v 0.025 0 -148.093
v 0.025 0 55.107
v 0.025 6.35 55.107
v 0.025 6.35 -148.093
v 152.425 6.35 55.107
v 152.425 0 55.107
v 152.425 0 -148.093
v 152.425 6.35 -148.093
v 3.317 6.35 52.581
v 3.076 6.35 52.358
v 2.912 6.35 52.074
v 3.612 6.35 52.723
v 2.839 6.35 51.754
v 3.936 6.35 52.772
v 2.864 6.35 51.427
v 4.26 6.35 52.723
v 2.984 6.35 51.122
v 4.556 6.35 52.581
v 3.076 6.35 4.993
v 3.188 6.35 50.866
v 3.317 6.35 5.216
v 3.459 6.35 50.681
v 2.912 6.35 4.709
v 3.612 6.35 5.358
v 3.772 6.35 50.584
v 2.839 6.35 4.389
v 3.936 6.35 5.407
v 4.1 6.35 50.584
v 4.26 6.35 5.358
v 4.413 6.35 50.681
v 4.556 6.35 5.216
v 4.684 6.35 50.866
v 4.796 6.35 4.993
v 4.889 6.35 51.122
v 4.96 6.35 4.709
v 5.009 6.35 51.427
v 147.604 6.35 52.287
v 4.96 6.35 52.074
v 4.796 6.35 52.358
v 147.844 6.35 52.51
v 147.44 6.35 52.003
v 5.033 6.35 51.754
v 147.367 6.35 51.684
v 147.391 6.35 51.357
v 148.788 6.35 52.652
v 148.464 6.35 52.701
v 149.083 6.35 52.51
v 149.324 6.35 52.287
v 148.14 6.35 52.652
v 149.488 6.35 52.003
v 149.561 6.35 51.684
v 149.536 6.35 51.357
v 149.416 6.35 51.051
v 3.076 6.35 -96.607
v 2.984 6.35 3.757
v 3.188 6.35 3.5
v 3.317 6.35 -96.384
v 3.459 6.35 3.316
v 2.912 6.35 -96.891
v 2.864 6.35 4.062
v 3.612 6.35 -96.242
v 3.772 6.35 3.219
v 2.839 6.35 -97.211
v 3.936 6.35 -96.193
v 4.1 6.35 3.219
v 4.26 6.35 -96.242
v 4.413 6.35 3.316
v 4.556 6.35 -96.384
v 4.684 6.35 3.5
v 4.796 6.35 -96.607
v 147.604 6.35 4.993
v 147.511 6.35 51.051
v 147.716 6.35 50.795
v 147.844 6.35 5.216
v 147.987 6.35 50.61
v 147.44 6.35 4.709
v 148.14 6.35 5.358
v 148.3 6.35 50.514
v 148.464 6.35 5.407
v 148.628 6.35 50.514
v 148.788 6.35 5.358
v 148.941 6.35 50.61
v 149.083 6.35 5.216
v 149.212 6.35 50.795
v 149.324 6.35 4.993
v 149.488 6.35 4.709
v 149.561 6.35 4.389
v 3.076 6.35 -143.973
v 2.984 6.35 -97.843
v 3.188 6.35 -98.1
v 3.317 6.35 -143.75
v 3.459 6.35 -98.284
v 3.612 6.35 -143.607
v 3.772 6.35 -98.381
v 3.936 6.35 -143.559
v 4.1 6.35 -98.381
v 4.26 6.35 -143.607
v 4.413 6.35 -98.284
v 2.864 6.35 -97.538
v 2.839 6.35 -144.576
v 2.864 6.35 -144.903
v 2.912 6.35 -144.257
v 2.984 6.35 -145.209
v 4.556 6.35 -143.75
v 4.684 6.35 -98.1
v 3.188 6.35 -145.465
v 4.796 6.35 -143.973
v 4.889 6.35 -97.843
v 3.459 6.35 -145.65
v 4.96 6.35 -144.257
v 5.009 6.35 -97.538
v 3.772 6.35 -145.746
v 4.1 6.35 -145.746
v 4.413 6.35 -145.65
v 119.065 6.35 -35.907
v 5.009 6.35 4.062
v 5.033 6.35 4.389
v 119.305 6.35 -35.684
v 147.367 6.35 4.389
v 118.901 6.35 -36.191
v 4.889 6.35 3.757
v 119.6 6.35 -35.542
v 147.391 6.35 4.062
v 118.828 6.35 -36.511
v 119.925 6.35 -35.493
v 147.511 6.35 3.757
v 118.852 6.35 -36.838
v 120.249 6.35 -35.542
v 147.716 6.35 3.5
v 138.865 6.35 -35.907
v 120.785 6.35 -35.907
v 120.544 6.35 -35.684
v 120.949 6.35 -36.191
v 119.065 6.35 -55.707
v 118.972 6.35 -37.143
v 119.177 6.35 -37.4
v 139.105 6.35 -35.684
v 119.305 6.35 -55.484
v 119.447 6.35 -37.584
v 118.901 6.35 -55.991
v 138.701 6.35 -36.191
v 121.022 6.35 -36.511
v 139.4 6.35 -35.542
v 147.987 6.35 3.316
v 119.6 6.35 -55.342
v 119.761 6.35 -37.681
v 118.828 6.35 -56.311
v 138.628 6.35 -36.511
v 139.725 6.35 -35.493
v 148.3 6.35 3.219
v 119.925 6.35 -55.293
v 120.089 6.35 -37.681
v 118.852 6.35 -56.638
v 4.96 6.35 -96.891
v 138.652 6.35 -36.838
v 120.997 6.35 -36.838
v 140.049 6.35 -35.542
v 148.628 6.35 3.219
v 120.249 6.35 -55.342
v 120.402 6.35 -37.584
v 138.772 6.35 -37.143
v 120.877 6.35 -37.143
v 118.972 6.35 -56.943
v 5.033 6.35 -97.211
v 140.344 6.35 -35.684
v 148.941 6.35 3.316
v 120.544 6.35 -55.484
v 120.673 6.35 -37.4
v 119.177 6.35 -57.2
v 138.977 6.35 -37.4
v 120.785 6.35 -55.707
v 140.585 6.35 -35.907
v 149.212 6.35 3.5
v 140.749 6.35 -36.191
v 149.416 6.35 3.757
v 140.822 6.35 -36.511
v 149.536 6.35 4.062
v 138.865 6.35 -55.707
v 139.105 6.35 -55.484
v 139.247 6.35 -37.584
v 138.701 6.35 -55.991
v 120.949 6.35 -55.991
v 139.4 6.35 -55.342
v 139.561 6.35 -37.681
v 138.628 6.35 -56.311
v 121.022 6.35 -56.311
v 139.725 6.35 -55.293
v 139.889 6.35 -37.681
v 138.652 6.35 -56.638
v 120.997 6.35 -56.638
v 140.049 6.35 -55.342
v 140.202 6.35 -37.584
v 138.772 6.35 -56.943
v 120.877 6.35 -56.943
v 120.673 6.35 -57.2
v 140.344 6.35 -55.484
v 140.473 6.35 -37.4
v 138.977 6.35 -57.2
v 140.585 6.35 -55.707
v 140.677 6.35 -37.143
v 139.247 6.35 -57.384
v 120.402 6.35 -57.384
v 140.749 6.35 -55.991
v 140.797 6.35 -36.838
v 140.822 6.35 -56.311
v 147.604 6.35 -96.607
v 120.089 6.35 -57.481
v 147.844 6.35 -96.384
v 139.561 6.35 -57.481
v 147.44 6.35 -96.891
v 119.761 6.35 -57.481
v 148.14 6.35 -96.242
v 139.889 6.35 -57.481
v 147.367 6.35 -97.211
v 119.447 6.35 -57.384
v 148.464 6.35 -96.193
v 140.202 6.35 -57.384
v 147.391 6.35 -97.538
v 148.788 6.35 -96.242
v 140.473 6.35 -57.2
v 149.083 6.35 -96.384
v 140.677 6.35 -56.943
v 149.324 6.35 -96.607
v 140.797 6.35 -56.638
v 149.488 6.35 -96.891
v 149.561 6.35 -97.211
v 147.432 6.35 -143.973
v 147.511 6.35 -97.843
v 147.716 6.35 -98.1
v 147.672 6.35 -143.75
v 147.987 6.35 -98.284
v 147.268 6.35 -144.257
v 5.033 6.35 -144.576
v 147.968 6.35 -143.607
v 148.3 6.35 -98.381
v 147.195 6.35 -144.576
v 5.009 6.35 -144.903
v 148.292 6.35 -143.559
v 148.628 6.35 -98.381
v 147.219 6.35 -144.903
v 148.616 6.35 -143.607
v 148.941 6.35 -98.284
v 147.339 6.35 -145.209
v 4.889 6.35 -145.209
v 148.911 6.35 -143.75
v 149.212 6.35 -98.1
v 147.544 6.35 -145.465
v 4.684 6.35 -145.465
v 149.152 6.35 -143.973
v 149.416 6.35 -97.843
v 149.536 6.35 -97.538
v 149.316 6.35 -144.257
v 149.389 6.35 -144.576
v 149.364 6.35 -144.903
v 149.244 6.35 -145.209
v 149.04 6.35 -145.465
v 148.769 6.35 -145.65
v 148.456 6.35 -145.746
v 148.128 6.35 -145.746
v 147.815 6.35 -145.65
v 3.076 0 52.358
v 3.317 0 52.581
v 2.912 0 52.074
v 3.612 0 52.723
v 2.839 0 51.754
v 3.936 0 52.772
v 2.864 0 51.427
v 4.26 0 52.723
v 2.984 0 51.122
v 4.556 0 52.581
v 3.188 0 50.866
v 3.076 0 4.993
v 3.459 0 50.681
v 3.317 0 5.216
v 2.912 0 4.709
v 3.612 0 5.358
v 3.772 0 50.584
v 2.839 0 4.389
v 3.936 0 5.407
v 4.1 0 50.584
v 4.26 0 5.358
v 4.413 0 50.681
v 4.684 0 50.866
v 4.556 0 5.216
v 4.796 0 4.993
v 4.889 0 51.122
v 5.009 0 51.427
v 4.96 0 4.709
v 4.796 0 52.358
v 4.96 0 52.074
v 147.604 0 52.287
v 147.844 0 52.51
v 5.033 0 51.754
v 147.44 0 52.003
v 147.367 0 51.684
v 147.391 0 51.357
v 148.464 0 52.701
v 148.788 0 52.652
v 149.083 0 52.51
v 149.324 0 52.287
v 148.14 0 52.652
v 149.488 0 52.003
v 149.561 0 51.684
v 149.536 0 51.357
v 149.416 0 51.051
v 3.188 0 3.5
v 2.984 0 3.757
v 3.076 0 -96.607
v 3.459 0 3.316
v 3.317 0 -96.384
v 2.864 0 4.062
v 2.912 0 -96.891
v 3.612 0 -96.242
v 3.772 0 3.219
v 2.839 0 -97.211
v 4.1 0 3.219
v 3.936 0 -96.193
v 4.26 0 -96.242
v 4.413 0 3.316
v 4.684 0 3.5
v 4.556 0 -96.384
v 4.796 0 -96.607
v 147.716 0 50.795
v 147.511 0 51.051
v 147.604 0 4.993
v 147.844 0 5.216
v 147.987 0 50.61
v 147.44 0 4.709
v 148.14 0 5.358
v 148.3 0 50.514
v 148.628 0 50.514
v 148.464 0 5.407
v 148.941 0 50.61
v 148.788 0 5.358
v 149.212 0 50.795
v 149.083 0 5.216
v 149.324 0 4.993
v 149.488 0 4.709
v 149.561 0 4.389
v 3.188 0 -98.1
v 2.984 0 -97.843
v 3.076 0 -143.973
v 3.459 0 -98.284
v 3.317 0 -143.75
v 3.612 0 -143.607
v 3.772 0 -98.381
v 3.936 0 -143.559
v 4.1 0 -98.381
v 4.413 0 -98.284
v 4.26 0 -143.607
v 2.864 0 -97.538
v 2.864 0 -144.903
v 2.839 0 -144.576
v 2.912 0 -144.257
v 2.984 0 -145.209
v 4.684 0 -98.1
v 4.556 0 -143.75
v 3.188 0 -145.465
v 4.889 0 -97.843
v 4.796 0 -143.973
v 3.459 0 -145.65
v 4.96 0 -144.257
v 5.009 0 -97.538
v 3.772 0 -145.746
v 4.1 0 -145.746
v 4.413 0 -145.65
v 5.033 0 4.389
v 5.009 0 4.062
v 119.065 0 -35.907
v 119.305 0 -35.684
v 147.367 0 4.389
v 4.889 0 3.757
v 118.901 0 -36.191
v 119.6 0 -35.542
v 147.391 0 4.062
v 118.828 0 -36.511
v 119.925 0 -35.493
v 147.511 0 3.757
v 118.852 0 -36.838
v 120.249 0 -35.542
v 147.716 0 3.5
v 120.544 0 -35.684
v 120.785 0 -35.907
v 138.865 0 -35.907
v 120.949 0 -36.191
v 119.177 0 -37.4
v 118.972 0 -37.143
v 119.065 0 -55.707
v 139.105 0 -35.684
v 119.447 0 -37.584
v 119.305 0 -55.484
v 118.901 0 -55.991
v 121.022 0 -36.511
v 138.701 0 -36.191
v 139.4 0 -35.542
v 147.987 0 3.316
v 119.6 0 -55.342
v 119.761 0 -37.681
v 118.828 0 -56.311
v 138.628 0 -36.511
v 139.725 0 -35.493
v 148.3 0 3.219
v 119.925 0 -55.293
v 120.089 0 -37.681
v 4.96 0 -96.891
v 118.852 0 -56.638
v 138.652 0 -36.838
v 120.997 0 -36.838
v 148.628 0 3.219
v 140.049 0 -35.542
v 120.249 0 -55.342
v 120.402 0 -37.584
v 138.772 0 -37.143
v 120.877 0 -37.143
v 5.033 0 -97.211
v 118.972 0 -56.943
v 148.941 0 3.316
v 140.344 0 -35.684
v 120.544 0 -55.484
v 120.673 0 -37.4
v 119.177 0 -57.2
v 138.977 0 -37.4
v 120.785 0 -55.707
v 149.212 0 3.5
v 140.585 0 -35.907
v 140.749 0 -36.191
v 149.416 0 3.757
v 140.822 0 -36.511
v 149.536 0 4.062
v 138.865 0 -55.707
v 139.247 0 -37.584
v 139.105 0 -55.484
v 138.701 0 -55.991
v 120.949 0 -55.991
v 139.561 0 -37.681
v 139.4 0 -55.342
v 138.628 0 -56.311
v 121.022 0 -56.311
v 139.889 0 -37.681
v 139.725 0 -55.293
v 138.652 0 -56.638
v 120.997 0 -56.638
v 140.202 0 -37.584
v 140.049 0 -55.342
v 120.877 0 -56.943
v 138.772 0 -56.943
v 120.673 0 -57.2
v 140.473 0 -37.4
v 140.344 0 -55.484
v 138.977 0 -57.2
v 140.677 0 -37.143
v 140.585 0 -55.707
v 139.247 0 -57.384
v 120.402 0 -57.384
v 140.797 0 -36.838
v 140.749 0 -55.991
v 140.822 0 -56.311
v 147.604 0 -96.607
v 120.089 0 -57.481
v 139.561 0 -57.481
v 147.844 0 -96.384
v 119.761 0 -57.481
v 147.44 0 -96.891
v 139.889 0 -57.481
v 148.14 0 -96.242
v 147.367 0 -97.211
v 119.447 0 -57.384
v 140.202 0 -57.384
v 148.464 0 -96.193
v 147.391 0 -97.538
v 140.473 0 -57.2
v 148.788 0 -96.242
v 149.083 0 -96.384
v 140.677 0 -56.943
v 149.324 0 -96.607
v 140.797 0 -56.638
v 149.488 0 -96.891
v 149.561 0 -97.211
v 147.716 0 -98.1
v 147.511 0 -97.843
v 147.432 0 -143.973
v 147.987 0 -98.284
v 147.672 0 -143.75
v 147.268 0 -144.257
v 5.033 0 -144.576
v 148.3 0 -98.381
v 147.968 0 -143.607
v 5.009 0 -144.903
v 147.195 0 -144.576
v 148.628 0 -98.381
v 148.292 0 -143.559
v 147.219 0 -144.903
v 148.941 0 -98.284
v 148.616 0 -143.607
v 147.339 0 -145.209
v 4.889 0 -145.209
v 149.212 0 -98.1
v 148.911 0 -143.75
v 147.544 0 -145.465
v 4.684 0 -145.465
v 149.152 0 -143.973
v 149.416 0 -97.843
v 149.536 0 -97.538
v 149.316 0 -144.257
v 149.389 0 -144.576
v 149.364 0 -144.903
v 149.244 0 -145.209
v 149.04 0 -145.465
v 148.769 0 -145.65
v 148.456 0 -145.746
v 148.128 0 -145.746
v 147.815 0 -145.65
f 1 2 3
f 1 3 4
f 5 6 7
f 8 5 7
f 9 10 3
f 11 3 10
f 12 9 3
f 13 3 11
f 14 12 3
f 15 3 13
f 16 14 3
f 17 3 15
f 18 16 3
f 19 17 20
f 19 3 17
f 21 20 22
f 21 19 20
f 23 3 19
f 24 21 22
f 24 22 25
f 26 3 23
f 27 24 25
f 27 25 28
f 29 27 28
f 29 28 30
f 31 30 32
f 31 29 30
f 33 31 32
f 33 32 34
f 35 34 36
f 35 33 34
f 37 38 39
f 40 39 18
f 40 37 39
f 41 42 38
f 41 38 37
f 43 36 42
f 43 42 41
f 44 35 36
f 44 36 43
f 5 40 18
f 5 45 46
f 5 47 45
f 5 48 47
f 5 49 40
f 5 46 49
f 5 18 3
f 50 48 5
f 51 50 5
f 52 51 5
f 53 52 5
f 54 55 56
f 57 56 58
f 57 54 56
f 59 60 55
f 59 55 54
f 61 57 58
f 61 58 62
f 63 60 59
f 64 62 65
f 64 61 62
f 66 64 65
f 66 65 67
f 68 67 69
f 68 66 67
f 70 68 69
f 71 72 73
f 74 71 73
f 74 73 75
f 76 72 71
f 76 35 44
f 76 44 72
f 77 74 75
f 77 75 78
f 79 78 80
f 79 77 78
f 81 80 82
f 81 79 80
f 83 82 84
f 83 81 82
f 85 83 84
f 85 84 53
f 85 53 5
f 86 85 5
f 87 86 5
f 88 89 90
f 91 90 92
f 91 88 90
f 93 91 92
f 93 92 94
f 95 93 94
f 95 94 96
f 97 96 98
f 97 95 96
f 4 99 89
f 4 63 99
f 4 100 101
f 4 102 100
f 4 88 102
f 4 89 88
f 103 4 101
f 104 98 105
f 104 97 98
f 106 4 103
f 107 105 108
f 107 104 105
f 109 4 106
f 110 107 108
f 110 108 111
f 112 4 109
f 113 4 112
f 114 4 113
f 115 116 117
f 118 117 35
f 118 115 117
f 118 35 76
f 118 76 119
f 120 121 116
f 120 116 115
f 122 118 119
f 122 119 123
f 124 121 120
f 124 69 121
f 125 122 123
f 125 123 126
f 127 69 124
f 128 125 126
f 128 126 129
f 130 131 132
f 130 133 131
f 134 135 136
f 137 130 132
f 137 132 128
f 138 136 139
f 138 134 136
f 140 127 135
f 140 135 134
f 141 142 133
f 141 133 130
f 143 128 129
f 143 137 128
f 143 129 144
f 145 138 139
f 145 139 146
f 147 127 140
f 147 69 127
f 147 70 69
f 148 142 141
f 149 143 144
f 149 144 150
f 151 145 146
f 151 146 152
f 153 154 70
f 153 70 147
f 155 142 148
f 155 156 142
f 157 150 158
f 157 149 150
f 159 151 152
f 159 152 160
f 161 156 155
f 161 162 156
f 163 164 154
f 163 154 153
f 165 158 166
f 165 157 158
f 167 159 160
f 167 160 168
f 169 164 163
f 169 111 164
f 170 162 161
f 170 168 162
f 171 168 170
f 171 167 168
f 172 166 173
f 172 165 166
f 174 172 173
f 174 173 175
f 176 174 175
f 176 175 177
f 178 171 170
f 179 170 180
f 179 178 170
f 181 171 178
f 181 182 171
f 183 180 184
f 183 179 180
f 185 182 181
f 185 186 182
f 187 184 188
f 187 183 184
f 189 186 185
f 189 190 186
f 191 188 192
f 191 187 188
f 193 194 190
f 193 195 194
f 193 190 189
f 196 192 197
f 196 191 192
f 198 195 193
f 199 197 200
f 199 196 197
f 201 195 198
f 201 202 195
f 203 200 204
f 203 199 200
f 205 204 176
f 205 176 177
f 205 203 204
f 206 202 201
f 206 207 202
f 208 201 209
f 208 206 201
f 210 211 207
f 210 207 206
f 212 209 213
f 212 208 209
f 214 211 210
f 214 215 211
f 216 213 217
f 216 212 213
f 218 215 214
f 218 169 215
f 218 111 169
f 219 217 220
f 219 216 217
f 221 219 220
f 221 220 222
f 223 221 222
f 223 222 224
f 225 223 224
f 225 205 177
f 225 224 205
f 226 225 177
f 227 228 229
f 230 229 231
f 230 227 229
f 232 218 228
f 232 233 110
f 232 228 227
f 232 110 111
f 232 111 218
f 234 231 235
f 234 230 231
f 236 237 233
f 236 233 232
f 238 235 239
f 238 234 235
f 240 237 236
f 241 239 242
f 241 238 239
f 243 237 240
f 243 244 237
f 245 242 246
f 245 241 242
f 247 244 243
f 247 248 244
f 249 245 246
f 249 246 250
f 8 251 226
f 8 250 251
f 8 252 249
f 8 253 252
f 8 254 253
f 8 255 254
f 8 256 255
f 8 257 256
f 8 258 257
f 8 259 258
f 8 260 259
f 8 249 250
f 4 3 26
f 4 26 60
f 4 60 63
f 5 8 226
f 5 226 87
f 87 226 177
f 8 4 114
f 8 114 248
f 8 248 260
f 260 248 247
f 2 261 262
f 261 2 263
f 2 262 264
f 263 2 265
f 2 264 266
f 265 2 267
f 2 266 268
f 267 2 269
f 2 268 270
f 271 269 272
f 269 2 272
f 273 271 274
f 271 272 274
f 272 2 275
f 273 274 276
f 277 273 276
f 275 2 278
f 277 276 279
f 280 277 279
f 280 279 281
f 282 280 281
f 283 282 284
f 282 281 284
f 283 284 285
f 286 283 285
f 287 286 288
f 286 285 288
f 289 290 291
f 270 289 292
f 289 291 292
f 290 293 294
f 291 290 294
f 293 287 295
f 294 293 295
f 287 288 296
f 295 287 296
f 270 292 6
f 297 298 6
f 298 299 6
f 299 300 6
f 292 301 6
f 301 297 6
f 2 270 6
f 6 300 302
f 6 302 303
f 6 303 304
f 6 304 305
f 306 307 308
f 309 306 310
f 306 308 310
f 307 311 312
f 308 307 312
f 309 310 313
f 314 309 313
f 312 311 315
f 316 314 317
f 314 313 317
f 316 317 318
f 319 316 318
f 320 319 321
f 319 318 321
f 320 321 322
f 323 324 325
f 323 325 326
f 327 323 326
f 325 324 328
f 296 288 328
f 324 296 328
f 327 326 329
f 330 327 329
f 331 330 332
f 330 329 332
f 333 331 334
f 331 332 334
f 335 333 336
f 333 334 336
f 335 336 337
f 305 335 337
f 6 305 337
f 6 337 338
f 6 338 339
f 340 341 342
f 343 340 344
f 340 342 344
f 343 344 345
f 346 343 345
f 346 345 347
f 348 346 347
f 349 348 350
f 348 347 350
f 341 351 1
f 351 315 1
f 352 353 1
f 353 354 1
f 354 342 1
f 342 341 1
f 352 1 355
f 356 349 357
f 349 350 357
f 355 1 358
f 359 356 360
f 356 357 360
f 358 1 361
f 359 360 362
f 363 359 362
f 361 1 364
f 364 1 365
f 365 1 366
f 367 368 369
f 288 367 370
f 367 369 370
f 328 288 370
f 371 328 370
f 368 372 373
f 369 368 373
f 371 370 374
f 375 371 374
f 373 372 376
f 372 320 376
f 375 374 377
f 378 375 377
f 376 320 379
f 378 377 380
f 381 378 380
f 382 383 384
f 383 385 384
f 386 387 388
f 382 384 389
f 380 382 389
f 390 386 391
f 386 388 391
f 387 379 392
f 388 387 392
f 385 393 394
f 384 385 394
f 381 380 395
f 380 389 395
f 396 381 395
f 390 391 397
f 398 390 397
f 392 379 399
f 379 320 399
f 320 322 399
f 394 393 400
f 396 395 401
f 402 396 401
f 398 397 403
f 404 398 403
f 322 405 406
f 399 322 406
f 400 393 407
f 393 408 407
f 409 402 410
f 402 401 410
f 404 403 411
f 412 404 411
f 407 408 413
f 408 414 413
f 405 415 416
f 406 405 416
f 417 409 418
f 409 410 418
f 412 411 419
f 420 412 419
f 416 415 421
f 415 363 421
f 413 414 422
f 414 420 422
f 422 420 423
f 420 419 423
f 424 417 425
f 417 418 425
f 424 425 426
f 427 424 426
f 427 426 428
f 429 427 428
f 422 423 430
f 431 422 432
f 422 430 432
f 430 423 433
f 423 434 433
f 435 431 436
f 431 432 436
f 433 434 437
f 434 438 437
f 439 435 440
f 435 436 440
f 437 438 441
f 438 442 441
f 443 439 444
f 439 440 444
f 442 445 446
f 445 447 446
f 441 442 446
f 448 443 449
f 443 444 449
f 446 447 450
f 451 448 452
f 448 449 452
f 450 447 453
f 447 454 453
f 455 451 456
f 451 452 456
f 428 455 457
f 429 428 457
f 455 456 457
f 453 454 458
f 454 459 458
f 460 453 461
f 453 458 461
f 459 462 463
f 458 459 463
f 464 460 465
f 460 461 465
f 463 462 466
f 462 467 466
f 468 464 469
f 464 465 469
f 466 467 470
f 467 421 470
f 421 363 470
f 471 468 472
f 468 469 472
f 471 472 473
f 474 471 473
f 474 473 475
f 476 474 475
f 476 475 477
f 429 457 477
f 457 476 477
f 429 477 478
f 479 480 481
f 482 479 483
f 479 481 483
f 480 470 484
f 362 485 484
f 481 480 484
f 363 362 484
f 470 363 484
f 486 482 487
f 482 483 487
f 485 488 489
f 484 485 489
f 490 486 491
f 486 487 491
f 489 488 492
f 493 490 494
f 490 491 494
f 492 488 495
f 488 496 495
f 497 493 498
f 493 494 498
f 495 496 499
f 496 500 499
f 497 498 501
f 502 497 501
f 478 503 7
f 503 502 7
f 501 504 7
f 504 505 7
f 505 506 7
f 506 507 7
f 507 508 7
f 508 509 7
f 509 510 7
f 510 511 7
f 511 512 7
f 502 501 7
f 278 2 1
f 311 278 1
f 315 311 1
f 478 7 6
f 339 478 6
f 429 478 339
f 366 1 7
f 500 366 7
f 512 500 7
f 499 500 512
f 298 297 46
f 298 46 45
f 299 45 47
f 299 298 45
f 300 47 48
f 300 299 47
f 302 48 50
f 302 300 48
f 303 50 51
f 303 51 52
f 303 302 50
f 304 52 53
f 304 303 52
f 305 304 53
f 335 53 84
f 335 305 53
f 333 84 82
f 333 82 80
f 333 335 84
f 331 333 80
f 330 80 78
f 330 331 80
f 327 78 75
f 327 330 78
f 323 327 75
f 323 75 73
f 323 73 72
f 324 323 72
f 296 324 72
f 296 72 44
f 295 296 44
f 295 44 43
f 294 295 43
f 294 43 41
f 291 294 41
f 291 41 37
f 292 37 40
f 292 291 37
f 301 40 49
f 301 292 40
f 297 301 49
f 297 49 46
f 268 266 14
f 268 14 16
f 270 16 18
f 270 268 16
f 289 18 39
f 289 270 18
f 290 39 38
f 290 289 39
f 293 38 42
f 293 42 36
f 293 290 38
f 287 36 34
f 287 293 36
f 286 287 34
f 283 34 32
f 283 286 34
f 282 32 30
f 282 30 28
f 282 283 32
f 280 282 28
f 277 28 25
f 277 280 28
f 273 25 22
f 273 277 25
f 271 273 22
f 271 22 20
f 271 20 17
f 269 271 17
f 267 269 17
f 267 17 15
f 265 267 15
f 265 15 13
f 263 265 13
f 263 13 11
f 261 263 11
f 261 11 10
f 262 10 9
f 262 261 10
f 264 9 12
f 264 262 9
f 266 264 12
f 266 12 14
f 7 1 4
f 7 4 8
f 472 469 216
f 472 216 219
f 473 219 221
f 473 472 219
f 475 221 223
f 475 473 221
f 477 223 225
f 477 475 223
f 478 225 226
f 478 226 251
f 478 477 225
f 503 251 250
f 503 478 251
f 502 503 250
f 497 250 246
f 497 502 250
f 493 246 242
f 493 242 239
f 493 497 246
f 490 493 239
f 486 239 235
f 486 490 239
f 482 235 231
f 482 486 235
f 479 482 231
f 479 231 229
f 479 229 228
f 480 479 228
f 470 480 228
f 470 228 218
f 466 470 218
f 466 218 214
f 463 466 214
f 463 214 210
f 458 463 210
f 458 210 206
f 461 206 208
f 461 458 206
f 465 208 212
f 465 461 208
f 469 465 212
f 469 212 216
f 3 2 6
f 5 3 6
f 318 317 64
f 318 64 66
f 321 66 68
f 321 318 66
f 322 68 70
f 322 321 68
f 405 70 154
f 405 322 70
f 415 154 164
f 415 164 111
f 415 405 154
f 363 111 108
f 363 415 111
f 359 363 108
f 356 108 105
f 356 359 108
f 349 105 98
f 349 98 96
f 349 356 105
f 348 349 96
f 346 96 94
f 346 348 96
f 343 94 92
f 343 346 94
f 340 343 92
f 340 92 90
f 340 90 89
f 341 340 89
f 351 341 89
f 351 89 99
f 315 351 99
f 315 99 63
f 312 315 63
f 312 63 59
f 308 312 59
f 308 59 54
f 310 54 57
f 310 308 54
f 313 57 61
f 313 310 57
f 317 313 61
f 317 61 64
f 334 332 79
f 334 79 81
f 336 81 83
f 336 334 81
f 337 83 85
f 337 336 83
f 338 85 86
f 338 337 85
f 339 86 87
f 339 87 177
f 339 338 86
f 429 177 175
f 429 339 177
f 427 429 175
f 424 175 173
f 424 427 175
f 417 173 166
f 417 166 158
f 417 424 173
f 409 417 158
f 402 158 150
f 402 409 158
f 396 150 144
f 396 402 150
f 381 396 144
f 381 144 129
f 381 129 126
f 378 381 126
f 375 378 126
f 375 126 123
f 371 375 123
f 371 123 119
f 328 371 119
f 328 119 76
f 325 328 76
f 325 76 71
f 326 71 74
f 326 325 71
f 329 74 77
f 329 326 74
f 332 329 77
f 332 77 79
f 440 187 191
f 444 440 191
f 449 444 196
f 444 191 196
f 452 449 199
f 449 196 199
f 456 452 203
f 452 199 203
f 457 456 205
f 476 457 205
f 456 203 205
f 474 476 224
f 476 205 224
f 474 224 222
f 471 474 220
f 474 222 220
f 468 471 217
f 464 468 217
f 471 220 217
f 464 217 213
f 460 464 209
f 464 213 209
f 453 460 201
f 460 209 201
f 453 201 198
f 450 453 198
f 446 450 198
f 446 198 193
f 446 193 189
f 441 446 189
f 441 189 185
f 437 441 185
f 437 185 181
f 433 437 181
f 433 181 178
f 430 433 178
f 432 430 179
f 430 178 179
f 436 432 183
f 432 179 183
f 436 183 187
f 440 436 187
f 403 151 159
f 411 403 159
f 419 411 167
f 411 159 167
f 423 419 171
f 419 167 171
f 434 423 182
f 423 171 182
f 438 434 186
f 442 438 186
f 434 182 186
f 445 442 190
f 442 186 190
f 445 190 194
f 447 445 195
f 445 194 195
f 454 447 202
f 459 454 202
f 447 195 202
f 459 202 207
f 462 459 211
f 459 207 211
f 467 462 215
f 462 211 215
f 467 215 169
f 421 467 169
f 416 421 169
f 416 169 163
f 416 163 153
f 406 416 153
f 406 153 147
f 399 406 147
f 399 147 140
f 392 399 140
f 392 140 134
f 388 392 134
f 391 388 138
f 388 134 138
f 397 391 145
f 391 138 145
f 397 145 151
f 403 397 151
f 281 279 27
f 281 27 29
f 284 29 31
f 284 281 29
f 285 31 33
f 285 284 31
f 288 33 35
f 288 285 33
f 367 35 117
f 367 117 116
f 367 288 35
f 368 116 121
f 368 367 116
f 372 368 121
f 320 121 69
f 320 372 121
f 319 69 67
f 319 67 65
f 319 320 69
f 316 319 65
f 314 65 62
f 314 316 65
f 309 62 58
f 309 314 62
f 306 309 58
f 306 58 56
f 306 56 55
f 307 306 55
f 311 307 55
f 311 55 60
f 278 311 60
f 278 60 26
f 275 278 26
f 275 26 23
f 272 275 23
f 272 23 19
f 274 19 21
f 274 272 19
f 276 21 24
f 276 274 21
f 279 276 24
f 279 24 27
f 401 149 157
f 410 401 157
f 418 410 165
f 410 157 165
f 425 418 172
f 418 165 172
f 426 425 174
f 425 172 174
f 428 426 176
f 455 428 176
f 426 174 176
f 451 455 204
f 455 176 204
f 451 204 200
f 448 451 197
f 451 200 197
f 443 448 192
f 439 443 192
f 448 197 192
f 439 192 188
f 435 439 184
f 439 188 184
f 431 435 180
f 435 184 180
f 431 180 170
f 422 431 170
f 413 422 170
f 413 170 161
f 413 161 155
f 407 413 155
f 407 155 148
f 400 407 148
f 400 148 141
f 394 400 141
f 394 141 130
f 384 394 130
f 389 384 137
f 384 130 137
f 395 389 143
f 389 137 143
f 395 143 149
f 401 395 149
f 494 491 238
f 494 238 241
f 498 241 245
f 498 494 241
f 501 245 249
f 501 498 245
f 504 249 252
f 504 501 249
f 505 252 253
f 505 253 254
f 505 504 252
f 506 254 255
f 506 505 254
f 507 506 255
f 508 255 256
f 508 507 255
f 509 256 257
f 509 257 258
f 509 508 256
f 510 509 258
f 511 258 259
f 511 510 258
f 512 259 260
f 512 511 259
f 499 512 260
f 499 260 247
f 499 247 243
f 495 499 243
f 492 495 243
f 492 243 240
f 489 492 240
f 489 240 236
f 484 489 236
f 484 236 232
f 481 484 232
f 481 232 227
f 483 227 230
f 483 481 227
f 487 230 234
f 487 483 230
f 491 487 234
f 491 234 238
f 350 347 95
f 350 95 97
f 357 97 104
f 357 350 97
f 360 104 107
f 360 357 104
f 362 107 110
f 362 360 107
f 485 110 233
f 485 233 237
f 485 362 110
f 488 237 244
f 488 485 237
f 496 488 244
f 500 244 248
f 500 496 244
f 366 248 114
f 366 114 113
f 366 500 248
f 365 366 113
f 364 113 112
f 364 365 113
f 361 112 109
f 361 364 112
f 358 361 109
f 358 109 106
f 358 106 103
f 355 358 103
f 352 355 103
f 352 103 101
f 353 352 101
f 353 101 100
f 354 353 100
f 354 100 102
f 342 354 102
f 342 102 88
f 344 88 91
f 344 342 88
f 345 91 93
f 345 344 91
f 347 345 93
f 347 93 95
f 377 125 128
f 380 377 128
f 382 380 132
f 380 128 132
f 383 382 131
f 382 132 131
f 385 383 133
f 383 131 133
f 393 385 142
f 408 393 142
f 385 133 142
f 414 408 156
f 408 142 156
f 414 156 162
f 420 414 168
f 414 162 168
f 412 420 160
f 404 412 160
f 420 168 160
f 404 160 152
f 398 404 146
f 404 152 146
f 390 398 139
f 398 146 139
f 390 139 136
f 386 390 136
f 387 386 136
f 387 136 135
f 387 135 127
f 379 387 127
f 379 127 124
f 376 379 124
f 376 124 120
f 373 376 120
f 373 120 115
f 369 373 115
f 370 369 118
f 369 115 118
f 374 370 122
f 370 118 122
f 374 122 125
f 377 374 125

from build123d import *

# Parameters (mm, degrees)
SKETCH1_W           = 152.4
SKETCH1_H           = 203.2
SKETCH1_R           = 1.1
BOSS_EXTRUDE1_DEPTH = 6.35
SKETCH2_R           = 1.1
CUT_EXTRUDE1_DEPTH  = 6.35


with BuildPart() as part:
    # Sketch1 → Boss-Extrude1 (new body)
    with BuildSketch(Plane(origin=(0, 0, 0), x_dir=(1, 0, 0), z_dir=(0, 1, 0))):
        with Locations((76.224714482, 46.493270824)):
            Rectangle(SKETCH1_W, SKETCH1_H)
        with Locations(Location((3.936211838, 97.293270824, 0), (0, 0, 270))):
            Circle(SKETCH1_R, mode=Mode.SUBTRACT)
        with Locations(Location((3.936211838, -4.306729176, 0), (0, 0, 270))):
            Circle(SKETCH1_R, mode=Mode.SUBTRACT)
        with Locations(Location((148.463788162, -4.306729176, 0), (0, 0, 270))):
            Circle(SKETCH1_R, mode=Mode.SUBTRACT)
        with Locations(Location((148.463788162, 97.293270824, 0), (0, 0, 270))):
            Circle(SKETCH1_R, mode=Mode.SUBTRACT)
        with Locations(Location((148.291793945, 144.658604846, 0), (0, 0, 270))):
            Circle(SKETCH1_R, mode=Mode.SUBTRACT)
        with Locations(Location((148.463788162, -51.601337012, 0), (0, 0, 270))):
            Circle(SKETCH1_R, mode=Mode.SUBTRACT)
        with Locations(Location((3.936211838, -51.672063198, 0), (0, 0, 270))):
            Circle(SKETCH1_R, mode=Mode.SUBTRACT)
        with Locations(Location((3.936211838, 144.658604846, 0), (0, 0, 270))):
            Circle(SKETCH1_R, mode=Mode.SUBTRACT)
    extrude(amount=BOSS_EXTRUDE1_DEPTH)

    # Sketch2 → Cut-Extrude1 (cut)
    with BuildSketch(Plane(origin=(0, 6.35, 0), x_dir=(1, 0, 0), z_dir=(0, 1, 0))):
        with Locations(Location((119.924714482, 56.393270824, 0), (0, 0, 270))):
            Circle(SKETCH2_R)
        with Locations(Location((119.924714482, 36.593270824, 0), (0, 0, 270))):
            Circle(SKETCH2_R)
        with Locations(Location((139.724714482, 36.593270824, 0), (0, 0, 270))):
            Circle(SKETCH2_R)
        with Locations(Location((139.724714482, 56.393270824, 0), (0, 0, 270))):
            Circle(SKETCH2_R)
    extrude(amount=-CUT_EXTRUDE1_DEPTH, mode=Mode.SUBTRACT)


solid = part.part
